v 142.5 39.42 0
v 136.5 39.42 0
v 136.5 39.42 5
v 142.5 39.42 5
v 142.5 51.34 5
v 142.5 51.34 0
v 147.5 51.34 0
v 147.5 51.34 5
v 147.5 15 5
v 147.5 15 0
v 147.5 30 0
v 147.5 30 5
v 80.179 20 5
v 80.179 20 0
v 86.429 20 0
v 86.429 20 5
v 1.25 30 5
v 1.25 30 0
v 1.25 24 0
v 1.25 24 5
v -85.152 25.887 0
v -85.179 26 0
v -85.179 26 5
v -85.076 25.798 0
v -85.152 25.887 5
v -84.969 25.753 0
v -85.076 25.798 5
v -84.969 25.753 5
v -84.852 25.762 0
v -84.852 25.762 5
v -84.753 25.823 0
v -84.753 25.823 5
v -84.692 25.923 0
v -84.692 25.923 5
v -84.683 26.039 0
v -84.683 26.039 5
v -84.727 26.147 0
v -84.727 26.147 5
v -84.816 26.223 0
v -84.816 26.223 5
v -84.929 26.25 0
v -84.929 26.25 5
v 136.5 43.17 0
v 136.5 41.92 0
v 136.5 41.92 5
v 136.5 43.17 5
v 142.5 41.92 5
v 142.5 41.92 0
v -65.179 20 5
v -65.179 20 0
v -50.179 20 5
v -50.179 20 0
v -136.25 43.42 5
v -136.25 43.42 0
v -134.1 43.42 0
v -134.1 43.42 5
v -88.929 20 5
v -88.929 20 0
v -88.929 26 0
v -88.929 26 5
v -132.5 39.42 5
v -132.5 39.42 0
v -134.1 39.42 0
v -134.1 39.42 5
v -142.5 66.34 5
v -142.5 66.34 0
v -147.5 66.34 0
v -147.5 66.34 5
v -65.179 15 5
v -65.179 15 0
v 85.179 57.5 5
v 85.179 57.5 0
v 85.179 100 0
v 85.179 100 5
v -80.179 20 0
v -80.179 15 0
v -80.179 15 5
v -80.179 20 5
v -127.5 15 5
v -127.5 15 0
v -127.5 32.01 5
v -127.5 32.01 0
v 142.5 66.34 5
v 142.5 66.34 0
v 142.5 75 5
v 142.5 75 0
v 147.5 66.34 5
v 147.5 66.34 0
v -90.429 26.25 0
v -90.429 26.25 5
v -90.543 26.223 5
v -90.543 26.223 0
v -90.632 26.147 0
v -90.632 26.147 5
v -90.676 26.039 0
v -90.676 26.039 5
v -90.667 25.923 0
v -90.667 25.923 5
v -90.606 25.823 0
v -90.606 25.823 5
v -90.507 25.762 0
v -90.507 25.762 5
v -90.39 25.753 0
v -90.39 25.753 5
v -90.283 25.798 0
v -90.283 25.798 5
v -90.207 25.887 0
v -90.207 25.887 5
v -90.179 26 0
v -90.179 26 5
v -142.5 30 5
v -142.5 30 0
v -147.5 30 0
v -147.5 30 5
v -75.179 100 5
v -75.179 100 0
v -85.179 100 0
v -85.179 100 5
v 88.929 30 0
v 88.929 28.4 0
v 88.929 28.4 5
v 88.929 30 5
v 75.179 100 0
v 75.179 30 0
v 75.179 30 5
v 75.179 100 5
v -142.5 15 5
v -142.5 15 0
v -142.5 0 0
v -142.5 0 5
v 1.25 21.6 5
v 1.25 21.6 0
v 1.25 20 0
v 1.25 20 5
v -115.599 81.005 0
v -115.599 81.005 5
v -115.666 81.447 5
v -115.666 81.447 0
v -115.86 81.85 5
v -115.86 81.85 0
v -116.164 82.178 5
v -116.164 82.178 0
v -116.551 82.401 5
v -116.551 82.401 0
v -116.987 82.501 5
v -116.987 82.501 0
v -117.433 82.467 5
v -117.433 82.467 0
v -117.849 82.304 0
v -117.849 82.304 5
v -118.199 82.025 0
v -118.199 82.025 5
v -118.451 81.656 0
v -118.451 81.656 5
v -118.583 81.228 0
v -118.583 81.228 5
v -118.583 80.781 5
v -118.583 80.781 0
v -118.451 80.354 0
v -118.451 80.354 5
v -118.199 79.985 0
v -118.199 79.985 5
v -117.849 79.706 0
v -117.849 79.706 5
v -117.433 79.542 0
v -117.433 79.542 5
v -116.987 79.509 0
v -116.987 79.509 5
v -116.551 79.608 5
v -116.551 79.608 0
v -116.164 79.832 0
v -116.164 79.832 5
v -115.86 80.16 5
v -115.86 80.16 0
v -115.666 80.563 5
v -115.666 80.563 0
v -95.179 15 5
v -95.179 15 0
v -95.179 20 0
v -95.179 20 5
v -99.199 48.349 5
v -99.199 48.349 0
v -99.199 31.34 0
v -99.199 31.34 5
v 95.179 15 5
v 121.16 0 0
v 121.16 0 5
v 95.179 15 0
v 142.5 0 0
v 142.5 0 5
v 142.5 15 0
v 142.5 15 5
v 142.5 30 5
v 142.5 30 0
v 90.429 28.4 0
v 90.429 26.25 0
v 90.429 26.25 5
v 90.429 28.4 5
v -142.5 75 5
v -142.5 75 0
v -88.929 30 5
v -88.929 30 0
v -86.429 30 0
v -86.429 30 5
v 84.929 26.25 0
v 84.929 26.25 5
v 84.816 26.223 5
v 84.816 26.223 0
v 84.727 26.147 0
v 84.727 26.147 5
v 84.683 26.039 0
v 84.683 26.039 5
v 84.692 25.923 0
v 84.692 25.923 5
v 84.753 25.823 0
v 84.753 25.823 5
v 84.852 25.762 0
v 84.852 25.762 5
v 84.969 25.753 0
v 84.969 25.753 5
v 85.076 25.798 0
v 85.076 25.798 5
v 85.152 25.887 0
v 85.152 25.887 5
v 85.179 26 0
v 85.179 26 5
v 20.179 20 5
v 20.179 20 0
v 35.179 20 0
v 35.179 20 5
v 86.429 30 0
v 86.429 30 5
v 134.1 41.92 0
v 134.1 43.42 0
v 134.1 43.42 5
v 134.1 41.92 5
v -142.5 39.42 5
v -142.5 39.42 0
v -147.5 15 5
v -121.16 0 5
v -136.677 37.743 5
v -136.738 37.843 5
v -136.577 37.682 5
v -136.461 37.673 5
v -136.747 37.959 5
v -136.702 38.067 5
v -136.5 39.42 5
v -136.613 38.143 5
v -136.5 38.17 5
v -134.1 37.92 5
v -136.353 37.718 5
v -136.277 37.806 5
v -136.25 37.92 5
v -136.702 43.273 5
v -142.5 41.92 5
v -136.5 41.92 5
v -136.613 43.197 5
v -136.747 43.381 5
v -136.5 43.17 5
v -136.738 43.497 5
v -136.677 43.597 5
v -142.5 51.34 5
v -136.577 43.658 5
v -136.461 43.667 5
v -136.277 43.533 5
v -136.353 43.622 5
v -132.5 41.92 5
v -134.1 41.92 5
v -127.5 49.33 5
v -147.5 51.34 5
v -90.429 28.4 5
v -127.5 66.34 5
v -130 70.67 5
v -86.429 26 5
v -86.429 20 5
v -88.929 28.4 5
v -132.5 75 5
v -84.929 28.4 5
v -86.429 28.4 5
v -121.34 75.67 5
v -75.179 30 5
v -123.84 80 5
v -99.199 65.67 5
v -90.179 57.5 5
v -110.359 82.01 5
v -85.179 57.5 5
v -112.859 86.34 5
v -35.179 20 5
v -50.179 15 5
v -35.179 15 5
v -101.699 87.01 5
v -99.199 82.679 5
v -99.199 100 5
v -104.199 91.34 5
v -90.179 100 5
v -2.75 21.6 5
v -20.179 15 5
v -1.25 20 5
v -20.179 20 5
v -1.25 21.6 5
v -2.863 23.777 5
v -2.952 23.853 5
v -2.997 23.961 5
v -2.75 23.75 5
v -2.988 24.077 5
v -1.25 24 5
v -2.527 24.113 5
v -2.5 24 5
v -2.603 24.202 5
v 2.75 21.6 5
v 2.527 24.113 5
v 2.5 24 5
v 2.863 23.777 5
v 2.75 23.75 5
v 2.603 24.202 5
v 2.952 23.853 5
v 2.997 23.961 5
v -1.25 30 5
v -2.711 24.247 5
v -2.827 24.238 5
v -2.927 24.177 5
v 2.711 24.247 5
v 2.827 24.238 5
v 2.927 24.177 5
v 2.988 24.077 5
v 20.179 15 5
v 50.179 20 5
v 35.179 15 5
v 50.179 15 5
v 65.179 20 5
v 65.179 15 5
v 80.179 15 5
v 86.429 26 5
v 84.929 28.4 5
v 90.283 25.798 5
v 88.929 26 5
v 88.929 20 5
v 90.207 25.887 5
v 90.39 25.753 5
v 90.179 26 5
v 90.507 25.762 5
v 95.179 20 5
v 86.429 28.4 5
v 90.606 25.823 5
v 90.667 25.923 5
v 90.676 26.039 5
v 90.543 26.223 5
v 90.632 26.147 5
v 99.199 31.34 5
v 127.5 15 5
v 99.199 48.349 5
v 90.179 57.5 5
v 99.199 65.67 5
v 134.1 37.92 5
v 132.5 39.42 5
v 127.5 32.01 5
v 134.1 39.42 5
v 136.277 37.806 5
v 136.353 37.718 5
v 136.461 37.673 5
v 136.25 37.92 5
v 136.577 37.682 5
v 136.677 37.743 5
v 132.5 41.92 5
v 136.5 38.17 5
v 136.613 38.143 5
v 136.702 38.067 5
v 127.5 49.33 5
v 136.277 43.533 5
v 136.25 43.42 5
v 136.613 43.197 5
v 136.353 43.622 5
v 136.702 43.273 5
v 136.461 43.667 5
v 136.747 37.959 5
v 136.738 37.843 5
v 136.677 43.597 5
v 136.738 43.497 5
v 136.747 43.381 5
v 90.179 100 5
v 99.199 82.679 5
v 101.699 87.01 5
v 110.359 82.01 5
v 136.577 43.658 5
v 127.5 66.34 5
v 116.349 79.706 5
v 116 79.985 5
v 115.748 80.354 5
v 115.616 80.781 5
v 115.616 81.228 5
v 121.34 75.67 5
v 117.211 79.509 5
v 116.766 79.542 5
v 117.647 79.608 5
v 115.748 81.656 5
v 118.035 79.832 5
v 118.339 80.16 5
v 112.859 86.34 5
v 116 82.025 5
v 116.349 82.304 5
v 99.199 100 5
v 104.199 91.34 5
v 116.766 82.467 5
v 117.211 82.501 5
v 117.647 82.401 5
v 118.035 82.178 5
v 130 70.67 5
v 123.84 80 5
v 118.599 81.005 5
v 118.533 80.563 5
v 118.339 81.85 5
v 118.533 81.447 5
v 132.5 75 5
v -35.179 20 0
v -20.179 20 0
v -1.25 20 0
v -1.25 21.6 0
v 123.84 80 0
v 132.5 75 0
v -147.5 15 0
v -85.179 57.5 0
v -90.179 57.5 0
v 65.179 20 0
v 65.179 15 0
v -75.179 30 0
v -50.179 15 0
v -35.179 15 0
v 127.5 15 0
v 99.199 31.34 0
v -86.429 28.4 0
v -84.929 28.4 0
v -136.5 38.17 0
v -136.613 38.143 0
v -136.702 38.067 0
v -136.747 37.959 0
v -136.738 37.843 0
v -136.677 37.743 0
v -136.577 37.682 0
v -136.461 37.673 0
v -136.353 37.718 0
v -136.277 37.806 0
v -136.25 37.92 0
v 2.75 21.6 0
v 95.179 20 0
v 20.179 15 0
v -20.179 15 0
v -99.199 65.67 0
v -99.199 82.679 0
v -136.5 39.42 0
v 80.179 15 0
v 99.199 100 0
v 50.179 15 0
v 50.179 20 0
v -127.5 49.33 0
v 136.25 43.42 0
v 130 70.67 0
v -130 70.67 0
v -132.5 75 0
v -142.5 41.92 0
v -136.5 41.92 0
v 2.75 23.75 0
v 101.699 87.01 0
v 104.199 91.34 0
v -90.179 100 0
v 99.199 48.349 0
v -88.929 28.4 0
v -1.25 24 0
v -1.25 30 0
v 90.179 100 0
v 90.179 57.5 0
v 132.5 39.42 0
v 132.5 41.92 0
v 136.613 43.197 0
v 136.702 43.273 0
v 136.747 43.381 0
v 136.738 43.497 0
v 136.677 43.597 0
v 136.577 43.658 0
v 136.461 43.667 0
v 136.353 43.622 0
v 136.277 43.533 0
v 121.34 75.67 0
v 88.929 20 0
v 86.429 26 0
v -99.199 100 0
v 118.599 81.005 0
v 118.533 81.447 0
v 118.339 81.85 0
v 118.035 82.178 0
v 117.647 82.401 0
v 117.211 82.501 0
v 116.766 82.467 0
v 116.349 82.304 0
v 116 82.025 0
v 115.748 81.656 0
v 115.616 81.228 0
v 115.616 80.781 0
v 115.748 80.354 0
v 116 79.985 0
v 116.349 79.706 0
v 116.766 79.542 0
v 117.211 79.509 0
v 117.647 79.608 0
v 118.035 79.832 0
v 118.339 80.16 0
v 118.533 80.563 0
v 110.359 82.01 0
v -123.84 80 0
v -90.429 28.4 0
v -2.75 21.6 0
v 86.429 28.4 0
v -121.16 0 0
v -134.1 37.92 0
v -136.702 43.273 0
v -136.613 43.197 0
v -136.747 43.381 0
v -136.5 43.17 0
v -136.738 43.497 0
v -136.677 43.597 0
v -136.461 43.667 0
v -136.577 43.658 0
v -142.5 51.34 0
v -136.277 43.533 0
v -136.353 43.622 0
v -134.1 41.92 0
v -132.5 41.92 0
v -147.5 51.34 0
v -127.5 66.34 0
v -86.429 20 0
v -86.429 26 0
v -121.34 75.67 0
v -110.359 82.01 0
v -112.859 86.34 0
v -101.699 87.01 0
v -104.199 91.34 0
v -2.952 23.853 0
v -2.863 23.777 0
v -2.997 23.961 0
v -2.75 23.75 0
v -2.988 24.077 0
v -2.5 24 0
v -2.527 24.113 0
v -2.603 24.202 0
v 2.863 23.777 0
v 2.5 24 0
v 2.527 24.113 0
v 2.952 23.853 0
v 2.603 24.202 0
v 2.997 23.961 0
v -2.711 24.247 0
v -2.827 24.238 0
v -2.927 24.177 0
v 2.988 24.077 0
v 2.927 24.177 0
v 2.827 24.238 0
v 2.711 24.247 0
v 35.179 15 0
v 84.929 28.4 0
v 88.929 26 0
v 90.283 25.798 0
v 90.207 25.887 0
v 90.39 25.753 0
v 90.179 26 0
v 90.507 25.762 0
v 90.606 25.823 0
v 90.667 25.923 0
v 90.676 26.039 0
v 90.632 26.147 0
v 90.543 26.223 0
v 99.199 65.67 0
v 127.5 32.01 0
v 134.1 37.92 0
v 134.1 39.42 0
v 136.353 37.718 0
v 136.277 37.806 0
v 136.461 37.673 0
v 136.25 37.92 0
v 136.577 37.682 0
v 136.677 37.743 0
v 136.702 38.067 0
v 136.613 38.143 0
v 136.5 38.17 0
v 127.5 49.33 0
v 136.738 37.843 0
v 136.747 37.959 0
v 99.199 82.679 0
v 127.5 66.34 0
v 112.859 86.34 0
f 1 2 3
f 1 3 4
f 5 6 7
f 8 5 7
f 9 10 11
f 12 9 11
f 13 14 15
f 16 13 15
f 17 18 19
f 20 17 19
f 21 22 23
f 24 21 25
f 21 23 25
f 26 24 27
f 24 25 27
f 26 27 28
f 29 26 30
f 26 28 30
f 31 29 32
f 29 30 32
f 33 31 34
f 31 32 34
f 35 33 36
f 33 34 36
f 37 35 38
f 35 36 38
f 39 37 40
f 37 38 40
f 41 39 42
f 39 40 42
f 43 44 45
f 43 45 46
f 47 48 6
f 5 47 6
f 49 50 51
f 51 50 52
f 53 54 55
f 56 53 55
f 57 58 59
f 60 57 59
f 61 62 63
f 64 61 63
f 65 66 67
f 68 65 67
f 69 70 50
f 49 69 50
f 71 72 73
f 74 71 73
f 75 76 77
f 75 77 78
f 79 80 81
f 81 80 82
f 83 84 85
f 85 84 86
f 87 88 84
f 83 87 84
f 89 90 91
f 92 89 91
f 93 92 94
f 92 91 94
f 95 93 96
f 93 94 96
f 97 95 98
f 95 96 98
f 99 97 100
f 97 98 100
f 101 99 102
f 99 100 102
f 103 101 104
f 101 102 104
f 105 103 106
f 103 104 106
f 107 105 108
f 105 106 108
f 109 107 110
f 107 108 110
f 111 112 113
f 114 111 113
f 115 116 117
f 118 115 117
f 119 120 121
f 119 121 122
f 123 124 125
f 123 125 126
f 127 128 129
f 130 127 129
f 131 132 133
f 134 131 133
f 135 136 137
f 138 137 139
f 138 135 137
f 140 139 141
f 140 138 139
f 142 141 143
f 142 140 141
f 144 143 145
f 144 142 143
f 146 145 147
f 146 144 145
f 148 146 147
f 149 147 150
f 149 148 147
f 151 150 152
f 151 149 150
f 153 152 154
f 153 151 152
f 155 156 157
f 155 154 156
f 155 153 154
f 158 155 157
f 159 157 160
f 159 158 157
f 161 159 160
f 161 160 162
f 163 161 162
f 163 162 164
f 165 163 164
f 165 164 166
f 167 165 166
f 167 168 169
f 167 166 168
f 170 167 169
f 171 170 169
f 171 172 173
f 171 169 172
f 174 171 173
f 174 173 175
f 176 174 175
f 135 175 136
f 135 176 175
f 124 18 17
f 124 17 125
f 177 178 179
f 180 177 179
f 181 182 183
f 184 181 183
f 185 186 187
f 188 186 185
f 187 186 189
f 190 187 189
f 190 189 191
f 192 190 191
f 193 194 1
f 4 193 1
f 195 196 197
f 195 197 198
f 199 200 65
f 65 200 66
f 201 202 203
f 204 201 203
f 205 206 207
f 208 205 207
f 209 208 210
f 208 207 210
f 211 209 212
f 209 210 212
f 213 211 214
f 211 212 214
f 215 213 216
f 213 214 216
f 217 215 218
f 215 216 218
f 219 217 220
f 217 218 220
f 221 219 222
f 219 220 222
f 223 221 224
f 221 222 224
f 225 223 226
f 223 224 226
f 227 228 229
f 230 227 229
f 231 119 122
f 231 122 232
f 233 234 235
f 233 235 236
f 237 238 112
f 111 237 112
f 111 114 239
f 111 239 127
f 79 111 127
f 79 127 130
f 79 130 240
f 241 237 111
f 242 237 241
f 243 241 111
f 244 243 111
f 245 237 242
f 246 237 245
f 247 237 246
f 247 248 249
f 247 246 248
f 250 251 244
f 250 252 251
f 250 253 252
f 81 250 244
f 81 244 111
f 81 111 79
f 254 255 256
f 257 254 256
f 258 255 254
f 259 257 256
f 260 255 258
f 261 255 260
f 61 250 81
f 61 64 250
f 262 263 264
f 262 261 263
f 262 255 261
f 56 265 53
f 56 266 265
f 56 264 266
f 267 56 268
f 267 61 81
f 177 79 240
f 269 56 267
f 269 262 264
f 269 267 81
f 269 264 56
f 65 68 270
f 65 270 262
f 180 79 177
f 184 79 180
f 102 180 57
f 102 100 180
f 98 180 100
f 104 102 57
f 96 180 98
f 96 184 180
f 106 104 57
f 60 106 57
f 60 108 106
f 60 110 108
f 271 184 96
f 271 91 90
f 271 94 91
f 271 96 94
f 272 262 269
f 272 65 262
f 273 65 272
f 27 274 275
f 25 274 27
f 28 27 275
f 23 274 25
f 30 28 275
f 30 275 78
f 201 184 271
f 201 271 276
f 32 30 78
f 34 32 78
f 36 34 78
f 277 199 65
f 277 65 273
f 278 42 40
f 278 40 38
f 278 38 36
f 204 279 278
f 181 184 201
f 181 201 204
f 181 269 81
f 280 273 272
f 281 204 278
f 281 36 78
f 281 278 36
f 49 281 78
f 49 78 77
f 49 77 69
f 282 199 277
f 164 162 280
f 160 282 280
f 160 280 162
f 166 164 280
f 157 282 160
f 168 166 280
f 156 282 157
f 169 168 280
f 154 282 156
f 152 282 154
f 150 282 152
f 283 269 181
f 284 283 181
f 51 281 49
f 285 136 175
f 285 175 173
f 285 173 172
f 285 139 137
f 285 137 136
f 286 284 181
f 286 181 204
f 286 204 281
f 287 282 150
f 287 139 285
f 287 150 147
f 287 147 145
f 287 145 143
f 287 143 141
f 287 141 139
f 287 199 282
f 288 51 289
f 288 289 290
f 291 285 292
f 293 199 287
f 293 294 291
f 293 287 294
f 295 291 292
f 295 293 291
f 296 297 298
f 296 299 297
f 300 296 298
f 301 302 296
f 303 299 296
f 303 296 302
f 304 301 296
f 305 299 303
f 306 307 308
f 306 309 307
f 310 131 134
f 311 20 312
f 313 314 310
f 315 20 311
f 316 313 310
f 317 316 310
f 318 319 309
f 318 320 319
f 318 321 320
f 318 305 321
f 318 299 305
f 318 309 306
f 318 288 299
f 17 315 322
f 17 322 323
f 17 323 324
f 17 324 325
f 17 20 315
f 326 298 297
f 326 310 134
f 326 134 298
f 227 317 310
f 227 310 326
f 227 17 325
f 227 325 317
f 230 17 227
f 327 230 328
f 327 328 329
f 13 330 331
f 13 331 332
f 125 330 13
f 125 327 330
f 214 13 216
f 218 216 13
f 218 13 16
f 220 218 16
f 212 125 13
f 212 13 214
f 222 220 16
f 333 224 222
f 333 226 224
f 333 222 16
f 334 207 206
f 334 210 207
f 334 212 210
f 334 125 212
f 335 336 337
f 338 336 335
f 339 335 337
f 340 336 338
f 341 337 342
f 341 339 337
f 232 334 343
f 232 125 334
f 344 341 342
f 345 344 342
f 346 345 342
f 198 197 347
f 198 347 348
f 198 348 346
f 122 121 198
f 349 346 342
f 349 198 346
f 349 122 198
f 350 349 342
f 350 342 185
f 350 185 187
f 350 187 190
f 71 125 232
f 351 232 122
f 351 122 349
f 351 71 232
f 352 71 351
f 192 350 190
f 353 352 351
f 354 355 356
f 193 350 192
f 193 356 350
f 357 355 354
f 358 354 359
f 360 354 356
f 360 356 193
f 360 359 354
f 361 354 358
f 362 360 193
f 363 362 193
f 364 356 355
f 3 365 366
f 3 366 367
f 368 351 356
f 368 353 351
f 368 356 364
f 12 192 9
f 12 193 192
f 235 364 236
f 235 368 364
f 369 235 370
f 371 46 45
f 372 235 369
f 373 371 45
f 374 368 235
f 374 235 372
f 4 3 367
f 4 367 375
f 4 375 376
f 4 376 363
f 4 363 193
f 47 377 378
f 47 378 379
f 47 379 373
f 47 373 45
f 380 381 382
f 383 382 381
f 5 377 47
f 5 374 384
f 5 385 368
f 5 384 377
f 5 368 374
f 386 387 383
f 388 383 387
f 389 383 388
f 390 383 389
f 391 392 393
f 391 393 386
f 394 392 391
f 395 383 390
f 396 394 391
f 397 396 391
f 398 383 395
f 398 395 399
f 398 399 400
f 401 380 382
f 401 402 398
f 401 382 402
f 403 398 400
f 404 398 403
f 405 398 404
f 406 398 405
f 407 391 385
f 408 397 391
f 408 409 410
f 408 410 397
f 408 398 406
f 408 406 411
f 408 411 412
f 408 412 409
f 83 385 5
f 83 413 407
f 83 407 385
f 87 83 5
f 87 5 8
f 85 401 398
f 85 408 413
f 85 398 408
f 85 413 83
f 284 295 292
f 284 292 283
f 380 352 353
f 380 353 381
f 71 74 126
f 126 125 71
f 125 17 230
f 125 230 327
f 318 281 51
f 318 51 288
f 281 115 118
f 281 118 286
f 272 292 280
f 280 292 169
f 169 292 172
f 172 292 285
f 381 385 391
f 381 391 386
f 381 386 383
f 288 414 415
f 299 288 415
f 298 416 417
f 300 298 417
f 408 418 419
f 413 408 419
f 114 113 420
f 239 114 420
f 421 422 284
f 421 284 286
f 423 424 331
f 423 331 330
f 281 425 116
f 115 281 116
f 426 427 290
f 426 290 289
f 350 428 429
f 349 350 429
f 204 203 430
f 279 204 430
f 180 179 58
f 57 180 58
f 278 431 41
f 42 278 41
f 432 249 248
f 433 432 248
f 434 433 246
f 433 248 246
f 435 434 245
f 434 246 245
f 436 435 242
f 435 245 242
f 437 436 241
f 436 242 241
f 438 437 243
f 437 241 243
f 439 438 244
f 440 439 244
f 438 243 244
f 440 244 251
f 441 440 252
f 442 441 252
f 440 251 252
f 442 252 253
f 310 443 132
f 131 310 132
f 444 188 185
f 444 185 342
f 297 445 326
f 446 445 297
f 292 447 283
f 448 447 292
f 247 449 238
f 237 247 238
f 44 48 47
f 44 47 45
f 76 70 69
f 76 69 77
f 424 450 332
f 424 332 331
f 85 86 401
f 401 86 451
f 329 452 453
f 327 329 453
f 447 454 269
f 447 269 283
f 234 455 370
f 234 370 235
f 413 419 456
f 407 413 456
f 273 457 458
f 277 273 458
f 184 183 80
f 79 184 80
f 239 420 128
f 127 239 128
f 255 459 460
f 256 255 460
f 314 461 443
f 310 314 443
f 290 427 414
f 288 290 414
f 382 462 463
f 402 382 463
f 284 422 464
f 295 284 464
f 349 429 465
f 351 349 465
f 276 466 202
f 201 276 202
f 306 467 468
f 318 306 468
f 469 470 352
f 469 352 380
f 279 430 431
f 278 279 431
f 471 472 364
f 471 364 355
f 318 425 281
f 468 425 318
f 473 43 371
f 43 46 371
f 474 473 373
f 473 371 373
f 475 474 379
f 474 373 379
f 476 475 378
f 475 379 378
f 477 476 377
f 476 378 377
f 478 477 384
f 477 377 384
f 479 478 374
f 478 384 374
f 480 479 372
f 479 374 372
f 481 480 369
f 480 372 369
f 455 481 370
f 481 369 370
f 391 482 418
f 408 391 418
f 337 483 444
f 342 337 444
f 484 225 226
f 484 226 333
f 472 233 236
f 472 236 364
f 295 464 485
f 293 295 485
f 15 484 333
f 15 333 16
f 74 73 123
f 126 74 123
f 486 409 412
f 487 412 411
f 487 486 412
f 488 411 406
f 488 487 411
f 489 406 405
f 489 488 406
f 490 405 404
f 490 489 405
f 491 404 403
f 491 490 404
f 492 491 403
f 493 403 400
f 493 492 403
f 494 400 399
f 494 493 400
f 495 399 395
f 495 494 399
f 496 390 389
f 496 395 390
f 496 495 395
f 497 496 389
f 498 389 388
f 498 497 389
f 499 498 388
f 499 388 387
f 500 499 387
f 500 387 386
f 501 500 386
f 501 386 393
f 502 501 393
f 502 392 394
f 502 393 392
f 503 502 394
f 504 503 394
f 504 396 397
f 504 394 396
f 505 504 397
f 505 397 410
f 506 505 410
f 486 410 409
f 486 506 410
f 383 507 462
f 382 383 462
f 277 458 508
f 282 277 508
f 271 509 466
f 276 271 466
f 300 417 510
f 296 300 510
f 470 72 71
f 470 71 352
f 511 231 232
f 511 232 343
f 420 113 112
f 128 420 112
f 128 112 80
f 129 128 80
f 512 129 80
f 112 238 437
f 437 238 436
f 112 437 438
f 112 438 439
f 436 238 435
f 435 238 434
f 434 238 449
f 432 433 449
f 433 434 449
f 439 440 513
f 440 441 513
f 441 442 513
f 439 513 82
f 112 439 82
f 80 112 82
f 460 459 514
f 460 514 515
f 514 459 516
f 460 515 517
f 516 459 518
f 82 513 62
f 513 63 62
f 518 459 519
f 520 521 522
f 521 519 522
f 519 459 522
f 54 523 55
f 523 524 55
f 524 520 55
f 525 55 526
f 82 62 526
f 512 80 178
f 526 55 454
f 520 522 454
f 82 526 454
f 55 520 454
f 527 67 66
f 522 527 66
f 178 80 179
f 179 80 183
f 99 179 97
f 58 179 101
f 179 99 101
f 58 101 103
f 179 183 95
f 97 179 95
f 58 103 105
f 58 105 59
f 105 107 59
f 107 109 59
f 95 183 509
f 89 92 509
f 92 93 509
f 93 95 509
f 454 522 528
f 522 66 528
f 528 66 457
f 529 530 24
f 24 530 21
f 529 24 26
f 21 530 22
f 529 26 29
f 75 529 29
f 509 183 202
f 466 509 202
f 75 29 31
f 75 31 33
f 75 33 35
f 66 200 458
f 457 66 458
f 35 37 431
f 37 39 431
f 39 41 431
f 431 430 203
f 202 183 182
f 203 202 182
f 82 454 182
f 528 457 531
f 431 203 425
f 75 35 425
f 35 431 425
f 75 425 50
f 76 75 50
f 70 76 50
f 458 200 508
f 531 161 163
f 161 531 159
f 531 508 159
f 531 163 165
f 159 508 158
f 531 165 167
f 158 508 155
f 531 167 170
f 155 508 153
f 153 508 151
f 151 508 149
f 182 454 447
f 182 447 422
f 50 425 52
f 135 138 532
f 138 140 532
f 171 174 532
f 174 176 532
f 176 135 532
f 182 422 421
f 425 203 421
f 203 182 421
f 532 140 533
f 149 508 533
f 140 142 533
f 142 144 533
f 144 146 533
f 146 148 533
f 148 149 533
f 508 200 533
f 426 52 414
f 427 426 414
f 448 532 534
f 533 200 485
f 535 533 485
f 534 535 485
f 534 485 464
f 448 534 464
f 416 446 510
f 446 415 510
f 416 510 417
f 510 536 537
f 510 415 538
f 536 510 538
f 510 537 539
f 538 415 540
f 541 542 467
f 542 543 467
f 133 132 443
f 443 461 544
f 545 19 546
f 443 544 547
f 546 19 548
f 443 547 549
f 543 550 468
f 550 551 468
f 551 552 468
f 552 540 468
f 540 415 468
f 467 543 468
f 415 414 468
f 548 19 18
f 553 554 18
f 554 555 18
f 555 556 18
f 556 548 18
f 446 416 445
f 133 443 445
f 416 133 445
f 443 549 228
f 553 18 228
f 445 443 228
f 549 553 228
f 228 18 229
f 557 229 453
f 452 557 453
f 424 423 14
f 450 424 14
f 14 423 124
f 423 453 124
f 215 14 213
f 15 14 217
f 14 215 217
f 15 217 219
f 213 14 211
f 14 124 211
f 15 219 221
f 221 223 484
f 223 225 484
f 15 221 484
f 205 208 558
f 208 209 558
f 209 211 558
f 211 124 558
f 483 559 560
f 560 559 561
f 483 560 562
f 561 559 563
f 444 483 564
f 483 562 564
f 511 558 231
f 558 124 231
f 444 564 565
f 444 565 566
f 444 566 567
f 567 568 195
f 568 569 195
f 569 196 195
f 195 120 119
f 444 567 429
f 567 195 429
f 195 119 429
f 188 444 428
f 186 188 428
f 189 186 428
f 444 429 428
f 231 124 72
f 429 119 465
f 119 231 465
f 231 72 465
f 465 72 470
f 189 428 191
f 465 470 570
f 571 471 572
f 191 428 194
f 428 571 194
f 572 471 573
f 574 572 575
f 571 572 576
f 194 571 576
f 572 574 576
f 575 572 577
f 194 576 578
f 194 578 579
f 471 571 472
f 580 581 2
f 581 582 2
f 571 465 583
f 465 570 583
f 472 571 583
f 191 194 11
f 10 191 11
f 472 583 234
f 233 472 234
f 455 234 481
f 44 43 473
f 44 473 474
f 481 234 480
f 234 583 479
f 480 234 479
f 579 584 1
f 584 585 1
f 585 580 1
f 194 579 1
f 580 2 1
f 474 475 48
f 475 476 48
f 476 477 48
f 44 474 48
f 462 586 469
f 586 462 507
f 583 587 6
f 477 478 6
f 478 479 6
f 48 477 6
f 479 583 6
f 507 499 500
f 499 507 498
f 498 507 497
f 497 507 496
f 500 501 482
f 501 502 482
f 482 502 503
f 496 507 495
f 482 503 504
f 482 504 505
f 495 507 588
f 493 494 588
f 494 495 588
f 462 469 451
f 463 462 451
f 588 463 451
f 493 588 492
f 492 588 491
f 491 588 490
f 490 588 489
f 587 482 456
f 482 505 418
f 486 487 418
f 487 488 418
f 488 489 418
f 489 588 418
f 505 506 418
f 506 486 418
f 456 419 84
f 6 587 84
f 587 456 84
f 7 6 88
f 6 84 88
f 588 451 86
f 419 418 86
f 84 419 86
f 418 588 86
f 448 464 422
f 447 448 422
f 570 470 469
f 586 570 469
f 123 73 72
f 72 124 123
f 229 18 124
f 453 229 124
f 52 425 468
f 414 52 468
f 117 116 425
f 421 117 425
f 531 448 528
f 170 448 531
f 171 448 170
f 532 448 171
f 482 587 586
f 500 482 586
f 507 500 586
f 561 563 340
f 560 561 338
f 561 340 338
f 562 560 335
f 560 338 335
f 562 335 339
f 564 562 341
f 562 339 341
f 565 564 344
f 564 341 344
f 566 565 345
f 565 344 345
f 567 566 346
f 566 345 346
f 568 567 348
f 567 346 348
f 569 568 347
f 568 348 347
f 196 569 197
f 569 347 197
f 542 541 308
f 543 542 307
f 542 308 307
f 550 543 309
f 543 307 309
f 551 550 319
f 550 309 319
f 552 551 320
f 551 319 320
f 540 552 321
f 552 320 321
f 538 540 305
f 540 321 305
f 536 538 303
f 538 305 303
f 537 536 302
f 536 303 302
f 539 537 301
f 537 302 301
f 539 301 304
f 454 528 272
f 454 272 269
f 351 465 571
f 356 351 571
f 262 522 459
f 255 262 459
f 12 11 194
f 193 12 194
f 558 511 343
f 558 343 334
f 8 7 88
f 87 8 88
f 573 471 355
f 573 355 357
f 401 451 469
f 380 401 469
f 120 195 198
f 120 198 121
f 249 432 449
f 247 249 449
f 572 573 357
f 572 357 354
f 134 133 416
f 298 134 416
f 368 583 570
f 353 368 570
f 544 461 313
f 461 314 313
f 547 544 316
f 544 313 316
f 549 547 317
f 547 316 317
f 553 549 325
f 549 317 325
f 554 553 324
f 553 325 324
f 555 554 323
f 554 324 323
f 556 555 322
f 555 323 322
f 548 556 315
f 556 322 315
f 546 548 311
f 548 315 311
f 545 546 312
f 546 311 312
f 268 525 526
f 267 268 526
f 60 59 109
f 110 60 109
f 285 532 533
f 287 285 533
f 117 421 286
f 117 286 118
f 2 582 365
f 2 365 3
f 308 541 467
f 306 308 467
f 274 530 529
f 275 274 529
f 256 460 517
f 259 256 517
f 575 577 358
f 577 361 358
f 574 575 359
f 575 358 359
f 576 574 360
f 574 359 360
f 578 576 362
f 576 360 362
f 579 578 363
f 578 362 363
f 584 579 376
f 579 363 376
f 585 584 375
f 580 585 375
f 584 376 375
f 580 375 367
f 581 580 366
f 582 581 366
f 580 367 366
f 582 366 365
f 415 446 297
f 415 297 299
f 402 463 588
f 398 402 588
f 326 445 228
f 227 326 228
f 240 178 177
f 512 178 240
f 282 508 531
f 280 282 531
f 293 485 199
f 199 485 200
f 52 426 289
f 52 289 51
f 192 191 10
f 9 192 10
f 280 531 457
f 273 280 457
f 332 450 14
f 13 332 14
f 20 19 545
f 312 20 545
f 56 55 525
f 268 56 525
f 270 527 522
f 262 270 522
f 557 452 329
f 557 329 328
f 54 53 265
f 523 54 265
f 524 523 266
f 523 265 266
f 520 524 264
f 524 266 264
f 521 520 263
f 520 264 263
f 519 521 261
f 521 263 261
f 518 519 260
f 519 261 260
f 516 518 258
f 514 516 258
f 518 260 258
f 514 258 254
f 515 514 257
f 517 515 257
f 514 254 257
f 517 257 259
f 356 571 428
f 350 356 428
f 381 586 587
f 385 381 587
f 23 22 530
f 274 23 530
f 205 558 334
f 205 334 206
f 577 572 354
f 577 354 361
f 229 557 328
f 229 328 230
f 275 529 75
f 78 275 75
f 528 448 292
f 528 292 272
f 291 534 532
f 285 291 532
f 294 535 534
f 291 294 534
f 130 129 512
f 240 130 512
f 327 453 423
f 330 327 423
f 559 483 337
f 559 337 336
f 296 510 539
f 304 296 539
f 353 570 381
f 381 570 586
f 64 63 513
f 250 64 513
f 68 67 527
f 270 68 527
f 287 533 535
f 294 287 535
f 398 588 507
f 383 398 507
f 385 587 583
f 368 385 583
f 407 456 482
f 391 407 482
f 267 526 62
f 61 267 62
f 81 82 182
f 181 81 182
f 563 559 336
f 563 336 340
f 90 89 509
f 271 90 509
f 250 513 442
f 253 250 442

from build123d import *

# Parameters (mm, degrees)
ESTRUSIONE_ESTRUSIONE1_DEPTH = 5
SCHIZZO2_R                   = 1.5
TAGLIO_ESTRUSIONE2_DEPTH     = 6
SCHIZZO5_W                   = 15
SCHIZZO5_H                   = 5
SCHIZZO5_W_2                 = 5
SCHIZZO5_H_2                 = 42.5
SCHIZZO5_W_3                 = 150.358983848
SCHIZZO5_H_3                 = 70
TAGLIO_ESTRUSIONE3_DEPTH     = 6
TAGLIO_ESTRUSIONE4_DEPTH     = 6
SCHIZZO7_R                   = 0.25
TAGLIO_ESTRUSIONE5_DEPTH     = 10


with BuildPart() as part:
    # Schizzo1 → Estrusione-Estrusione1 (new body)
    with BuildSketch(Plane.XY):
        Polygon((-142.5, 75), (-142.5, 66.339745962), (-147.5, 66.339745962), (-147.5, 51.339745962), (-142.5, 51.339745962), (-142.5, 30), (-147.5, 30), (-147.5, 15), (-142.5, 15), (-142.5, 0), (142.5, 0), (142.5, 15), (147.5, 15), (147.5, 30), (142.5, 30), (142.5, 51.339745962), (147.5, 51.339745962), (147.5, 66.339745962), (142.5, 66.339745962), (142.5, 75), (99.198729811, 100), (-99.198729811, 100), align=None)
    extrude(amount=ESTRUSIONE_ESTRUSIONE1_DEPTH)

    # Schizzo2 → Taglio-Estrusione2 (cut, through all)
    with BuildSketch(Plane.XY):
        with Locations((-117.099364905, 81.004809472)):
            Circle(SCHIZZO2_R)
        with Locations((117.099364905, 81.004809472)):
            Circle(SCHIZZO2_R)
        Polygon((-99.198729811, 82.679491924), (-127.5, 66.339745962), (-127.5, 49.330127019), (-99.198729811, 65.669872981), align=None)
        Polygon((99.198729811, 31.339745962), (99.198729811, 48.349364905), (127.5, 32.009618943), (127.5, 15), align=None)
        Polygon((-95.179491924, 15), (-121.160254038, 0), (121.160254038, 0), (95.179491924, 15), align=None)
        Polygon((-99.198729811, 31.339745962), (-127.5, 15), (-127.5, 32.009618943), (-99.198729811, 48.349364905), align=None)
        Polygon((99.198729811, 65.669872981), (99.198729811, 82.679491924), (127.5, 66.339745962), (127.5, 49.330127019), align=None)
        Polygon((-132.5, 75), (-123.839745962, 80), (-121.339745962, 75.669872981), (-130, 70.669872981), align=None)
        Polygon((-104.198729811, 91.339745962), (-101.698729811, 87.009618943), (-110.358983849, 82.009618943), (-112.858983849, 86.339745962), align=None)
        Polygon((132.5, 75), (130, 70.669872981), (121.339745962, 75.669872981), (123.839745962, 80), align=None)
        Polygon((104.198729811, 91.339745962), (112.858983849, 86.339745962), (110.358983849, 82.009618943), (101.698729811, 87.009618943), align=None)
    extrude(amount=TAGLIO_ESTRUSIONE2_DEPTH, mode=Mode.SUBTRACT)

    # Schizzo5 → Taglio-Estrusione3 (cut, through all)
    with BuildSketch(Plane.XY):
        with Locations((-87.679491924, 17.5)):
            Rectangle(SCHIZZO5_W, SCHIZZO5_H)
        with Locations((-57.679491924, 17.5)):
            Rectangle(SCHIZZO5_W, SCHIZZO5_H)
        with Locations((-27.679491924, 17.5)):
            Rectangle(SCHIZZO5_W, SCHIZZO5_H)
        with Locations((27.679491924, 17.5)):
            Rectangle(SCHIZZO5_W, SCHIZZO5_H)
        with Locations((57.679491924, 17.5)):
            Rectangle(SCHIZZO5_W, SCHIZZO5_H)
        with Locations((87.679491924, 17.5)):
            Rectangle(SCHIZZO5_W, SCHIZZO5_H)
        with Locations((87.679491924, 78.75)):
            Rectangle(SCHIZZO5_W_2, SCHIZZO5_H_2)
        with Locations((-87.679491924, 78.75)):
            Rectangle(SCHIZZO5_W_2, SCHIZZO5_H_2)
        with Locations((0, 65)):
            Rectangle(SCHIZZO5_W_3, SCHIZZO5_H_3)
    extrude(amount=TAGLIO_ESTRUSIONE3_DEPTH, mode=Mode.SUBTRACT)

    # Schizzo6 → Taglio-Estrusione4 (cut, through all)
    with BuildSketch(Plane.XY):
        Polygon((-142.5, 41.919872981), (-136.5, 41.919872981), (-136.5, 43.419872981), (-134.1, 43.419872981), (-134.1, 41.919872981), (-132.5, 41.919872981), (-132.5, 39.419872981), (-134.1, 39.419872981), (-134.1, 37.919872981), (-136.5, 37.919872981), (-136.5, 39.419872981), (-142.5, 39.419872981), align=None)
        Polygon((134.1, 43.419872981), (134.1, 41.919872981), (132.5, 41.919872981), (132.5, 39.419872981), (134.1, 39.419872981), (134.1, 37.919872981), (136.5, 37.919872981), (136.5, 39.419872981), (142.5, 39.419872981), (142.5, 41.919872981), (136.5, 41.919872981), (136.5, 43.419872981), align=None)
        Polygon((-88.929491924, 20), (-88.929491924, 26), (-90.429491924, 26), (-90.429491924, 28.4), (-88.929491924, 28.4), (-88.929491924, 30), (-86.429491924, 30), (-86.429491924, 28.4), (-84.929491924, 28.4), (-84.929491924, 26), (-86.429491924, 26), (-86.429491924, 20), align=None)
        Polygon((86.429491924, 20), (88.929491924, 20), (88.929491924, 26), (90.429491924, 26), (90.429491924, 28.4), (88.929491924, 28.4), (88.929491924, 30), (86.429491924, 30), (86.429491924, 28.4), (84.929491924, 28.4), (84.929491924, 26), (86.429491924, 26), align=None)
        Polygon((-1.25, 20), (-1.25, 21.6), (-2.75, 21.6), (-2.75, 24), (-1.25, 24), (-1.25, 30), (1.25, 30), (1.25, 24), (2.75, 24), (2.75, 21.6), (1.25, 21.6), (1.25, 20), align=None)
    extrude(amount=TAGLIO_ESTRUSIONE4_DEPTH, mode=Mode.SUBTRACT)

    # Schizzo7 → Taglio-Estrusione5 (cut)
    with BuildSketch(Plane.XY.offset(5)):
        with Locations((-136.5, 43.419872981)):
            Circle(SCHIZZO7_R)
        with Locations((-136.5, 37.919872981)):
            Circle(SCHIZZO7_R)
        with Locations((-90.429491924, 26)):
            Circle(SCHIZZO7_R)
        with Locations((-84.929491924, 26)):
            Circle(SCHIZZO7_R)
        with Locations((-2.75, 24)):
            Circle(SCHIZZO7_R)
        with Locations((2.75, 24)):
            Circle(SCHIZZO7_R)
        with Locations((84.929491924, 26)):
            Circle(SCHIZZO7_R)
        with Locations((90.429491924, 26)):
            Circle(SCHIZZO7_R)
        with Locations((136.5, 43.419872981)):
            Circle(SCHIZZO7_R)
        with Locations((136.5, 37.919872981)):
            Circle(SCHIZZO7_R)
    extrude(amount=-TAGLIO_ESTRUSIONE5_DEPTH, mode=Mode.SUBTRACT)


solid = part.part
